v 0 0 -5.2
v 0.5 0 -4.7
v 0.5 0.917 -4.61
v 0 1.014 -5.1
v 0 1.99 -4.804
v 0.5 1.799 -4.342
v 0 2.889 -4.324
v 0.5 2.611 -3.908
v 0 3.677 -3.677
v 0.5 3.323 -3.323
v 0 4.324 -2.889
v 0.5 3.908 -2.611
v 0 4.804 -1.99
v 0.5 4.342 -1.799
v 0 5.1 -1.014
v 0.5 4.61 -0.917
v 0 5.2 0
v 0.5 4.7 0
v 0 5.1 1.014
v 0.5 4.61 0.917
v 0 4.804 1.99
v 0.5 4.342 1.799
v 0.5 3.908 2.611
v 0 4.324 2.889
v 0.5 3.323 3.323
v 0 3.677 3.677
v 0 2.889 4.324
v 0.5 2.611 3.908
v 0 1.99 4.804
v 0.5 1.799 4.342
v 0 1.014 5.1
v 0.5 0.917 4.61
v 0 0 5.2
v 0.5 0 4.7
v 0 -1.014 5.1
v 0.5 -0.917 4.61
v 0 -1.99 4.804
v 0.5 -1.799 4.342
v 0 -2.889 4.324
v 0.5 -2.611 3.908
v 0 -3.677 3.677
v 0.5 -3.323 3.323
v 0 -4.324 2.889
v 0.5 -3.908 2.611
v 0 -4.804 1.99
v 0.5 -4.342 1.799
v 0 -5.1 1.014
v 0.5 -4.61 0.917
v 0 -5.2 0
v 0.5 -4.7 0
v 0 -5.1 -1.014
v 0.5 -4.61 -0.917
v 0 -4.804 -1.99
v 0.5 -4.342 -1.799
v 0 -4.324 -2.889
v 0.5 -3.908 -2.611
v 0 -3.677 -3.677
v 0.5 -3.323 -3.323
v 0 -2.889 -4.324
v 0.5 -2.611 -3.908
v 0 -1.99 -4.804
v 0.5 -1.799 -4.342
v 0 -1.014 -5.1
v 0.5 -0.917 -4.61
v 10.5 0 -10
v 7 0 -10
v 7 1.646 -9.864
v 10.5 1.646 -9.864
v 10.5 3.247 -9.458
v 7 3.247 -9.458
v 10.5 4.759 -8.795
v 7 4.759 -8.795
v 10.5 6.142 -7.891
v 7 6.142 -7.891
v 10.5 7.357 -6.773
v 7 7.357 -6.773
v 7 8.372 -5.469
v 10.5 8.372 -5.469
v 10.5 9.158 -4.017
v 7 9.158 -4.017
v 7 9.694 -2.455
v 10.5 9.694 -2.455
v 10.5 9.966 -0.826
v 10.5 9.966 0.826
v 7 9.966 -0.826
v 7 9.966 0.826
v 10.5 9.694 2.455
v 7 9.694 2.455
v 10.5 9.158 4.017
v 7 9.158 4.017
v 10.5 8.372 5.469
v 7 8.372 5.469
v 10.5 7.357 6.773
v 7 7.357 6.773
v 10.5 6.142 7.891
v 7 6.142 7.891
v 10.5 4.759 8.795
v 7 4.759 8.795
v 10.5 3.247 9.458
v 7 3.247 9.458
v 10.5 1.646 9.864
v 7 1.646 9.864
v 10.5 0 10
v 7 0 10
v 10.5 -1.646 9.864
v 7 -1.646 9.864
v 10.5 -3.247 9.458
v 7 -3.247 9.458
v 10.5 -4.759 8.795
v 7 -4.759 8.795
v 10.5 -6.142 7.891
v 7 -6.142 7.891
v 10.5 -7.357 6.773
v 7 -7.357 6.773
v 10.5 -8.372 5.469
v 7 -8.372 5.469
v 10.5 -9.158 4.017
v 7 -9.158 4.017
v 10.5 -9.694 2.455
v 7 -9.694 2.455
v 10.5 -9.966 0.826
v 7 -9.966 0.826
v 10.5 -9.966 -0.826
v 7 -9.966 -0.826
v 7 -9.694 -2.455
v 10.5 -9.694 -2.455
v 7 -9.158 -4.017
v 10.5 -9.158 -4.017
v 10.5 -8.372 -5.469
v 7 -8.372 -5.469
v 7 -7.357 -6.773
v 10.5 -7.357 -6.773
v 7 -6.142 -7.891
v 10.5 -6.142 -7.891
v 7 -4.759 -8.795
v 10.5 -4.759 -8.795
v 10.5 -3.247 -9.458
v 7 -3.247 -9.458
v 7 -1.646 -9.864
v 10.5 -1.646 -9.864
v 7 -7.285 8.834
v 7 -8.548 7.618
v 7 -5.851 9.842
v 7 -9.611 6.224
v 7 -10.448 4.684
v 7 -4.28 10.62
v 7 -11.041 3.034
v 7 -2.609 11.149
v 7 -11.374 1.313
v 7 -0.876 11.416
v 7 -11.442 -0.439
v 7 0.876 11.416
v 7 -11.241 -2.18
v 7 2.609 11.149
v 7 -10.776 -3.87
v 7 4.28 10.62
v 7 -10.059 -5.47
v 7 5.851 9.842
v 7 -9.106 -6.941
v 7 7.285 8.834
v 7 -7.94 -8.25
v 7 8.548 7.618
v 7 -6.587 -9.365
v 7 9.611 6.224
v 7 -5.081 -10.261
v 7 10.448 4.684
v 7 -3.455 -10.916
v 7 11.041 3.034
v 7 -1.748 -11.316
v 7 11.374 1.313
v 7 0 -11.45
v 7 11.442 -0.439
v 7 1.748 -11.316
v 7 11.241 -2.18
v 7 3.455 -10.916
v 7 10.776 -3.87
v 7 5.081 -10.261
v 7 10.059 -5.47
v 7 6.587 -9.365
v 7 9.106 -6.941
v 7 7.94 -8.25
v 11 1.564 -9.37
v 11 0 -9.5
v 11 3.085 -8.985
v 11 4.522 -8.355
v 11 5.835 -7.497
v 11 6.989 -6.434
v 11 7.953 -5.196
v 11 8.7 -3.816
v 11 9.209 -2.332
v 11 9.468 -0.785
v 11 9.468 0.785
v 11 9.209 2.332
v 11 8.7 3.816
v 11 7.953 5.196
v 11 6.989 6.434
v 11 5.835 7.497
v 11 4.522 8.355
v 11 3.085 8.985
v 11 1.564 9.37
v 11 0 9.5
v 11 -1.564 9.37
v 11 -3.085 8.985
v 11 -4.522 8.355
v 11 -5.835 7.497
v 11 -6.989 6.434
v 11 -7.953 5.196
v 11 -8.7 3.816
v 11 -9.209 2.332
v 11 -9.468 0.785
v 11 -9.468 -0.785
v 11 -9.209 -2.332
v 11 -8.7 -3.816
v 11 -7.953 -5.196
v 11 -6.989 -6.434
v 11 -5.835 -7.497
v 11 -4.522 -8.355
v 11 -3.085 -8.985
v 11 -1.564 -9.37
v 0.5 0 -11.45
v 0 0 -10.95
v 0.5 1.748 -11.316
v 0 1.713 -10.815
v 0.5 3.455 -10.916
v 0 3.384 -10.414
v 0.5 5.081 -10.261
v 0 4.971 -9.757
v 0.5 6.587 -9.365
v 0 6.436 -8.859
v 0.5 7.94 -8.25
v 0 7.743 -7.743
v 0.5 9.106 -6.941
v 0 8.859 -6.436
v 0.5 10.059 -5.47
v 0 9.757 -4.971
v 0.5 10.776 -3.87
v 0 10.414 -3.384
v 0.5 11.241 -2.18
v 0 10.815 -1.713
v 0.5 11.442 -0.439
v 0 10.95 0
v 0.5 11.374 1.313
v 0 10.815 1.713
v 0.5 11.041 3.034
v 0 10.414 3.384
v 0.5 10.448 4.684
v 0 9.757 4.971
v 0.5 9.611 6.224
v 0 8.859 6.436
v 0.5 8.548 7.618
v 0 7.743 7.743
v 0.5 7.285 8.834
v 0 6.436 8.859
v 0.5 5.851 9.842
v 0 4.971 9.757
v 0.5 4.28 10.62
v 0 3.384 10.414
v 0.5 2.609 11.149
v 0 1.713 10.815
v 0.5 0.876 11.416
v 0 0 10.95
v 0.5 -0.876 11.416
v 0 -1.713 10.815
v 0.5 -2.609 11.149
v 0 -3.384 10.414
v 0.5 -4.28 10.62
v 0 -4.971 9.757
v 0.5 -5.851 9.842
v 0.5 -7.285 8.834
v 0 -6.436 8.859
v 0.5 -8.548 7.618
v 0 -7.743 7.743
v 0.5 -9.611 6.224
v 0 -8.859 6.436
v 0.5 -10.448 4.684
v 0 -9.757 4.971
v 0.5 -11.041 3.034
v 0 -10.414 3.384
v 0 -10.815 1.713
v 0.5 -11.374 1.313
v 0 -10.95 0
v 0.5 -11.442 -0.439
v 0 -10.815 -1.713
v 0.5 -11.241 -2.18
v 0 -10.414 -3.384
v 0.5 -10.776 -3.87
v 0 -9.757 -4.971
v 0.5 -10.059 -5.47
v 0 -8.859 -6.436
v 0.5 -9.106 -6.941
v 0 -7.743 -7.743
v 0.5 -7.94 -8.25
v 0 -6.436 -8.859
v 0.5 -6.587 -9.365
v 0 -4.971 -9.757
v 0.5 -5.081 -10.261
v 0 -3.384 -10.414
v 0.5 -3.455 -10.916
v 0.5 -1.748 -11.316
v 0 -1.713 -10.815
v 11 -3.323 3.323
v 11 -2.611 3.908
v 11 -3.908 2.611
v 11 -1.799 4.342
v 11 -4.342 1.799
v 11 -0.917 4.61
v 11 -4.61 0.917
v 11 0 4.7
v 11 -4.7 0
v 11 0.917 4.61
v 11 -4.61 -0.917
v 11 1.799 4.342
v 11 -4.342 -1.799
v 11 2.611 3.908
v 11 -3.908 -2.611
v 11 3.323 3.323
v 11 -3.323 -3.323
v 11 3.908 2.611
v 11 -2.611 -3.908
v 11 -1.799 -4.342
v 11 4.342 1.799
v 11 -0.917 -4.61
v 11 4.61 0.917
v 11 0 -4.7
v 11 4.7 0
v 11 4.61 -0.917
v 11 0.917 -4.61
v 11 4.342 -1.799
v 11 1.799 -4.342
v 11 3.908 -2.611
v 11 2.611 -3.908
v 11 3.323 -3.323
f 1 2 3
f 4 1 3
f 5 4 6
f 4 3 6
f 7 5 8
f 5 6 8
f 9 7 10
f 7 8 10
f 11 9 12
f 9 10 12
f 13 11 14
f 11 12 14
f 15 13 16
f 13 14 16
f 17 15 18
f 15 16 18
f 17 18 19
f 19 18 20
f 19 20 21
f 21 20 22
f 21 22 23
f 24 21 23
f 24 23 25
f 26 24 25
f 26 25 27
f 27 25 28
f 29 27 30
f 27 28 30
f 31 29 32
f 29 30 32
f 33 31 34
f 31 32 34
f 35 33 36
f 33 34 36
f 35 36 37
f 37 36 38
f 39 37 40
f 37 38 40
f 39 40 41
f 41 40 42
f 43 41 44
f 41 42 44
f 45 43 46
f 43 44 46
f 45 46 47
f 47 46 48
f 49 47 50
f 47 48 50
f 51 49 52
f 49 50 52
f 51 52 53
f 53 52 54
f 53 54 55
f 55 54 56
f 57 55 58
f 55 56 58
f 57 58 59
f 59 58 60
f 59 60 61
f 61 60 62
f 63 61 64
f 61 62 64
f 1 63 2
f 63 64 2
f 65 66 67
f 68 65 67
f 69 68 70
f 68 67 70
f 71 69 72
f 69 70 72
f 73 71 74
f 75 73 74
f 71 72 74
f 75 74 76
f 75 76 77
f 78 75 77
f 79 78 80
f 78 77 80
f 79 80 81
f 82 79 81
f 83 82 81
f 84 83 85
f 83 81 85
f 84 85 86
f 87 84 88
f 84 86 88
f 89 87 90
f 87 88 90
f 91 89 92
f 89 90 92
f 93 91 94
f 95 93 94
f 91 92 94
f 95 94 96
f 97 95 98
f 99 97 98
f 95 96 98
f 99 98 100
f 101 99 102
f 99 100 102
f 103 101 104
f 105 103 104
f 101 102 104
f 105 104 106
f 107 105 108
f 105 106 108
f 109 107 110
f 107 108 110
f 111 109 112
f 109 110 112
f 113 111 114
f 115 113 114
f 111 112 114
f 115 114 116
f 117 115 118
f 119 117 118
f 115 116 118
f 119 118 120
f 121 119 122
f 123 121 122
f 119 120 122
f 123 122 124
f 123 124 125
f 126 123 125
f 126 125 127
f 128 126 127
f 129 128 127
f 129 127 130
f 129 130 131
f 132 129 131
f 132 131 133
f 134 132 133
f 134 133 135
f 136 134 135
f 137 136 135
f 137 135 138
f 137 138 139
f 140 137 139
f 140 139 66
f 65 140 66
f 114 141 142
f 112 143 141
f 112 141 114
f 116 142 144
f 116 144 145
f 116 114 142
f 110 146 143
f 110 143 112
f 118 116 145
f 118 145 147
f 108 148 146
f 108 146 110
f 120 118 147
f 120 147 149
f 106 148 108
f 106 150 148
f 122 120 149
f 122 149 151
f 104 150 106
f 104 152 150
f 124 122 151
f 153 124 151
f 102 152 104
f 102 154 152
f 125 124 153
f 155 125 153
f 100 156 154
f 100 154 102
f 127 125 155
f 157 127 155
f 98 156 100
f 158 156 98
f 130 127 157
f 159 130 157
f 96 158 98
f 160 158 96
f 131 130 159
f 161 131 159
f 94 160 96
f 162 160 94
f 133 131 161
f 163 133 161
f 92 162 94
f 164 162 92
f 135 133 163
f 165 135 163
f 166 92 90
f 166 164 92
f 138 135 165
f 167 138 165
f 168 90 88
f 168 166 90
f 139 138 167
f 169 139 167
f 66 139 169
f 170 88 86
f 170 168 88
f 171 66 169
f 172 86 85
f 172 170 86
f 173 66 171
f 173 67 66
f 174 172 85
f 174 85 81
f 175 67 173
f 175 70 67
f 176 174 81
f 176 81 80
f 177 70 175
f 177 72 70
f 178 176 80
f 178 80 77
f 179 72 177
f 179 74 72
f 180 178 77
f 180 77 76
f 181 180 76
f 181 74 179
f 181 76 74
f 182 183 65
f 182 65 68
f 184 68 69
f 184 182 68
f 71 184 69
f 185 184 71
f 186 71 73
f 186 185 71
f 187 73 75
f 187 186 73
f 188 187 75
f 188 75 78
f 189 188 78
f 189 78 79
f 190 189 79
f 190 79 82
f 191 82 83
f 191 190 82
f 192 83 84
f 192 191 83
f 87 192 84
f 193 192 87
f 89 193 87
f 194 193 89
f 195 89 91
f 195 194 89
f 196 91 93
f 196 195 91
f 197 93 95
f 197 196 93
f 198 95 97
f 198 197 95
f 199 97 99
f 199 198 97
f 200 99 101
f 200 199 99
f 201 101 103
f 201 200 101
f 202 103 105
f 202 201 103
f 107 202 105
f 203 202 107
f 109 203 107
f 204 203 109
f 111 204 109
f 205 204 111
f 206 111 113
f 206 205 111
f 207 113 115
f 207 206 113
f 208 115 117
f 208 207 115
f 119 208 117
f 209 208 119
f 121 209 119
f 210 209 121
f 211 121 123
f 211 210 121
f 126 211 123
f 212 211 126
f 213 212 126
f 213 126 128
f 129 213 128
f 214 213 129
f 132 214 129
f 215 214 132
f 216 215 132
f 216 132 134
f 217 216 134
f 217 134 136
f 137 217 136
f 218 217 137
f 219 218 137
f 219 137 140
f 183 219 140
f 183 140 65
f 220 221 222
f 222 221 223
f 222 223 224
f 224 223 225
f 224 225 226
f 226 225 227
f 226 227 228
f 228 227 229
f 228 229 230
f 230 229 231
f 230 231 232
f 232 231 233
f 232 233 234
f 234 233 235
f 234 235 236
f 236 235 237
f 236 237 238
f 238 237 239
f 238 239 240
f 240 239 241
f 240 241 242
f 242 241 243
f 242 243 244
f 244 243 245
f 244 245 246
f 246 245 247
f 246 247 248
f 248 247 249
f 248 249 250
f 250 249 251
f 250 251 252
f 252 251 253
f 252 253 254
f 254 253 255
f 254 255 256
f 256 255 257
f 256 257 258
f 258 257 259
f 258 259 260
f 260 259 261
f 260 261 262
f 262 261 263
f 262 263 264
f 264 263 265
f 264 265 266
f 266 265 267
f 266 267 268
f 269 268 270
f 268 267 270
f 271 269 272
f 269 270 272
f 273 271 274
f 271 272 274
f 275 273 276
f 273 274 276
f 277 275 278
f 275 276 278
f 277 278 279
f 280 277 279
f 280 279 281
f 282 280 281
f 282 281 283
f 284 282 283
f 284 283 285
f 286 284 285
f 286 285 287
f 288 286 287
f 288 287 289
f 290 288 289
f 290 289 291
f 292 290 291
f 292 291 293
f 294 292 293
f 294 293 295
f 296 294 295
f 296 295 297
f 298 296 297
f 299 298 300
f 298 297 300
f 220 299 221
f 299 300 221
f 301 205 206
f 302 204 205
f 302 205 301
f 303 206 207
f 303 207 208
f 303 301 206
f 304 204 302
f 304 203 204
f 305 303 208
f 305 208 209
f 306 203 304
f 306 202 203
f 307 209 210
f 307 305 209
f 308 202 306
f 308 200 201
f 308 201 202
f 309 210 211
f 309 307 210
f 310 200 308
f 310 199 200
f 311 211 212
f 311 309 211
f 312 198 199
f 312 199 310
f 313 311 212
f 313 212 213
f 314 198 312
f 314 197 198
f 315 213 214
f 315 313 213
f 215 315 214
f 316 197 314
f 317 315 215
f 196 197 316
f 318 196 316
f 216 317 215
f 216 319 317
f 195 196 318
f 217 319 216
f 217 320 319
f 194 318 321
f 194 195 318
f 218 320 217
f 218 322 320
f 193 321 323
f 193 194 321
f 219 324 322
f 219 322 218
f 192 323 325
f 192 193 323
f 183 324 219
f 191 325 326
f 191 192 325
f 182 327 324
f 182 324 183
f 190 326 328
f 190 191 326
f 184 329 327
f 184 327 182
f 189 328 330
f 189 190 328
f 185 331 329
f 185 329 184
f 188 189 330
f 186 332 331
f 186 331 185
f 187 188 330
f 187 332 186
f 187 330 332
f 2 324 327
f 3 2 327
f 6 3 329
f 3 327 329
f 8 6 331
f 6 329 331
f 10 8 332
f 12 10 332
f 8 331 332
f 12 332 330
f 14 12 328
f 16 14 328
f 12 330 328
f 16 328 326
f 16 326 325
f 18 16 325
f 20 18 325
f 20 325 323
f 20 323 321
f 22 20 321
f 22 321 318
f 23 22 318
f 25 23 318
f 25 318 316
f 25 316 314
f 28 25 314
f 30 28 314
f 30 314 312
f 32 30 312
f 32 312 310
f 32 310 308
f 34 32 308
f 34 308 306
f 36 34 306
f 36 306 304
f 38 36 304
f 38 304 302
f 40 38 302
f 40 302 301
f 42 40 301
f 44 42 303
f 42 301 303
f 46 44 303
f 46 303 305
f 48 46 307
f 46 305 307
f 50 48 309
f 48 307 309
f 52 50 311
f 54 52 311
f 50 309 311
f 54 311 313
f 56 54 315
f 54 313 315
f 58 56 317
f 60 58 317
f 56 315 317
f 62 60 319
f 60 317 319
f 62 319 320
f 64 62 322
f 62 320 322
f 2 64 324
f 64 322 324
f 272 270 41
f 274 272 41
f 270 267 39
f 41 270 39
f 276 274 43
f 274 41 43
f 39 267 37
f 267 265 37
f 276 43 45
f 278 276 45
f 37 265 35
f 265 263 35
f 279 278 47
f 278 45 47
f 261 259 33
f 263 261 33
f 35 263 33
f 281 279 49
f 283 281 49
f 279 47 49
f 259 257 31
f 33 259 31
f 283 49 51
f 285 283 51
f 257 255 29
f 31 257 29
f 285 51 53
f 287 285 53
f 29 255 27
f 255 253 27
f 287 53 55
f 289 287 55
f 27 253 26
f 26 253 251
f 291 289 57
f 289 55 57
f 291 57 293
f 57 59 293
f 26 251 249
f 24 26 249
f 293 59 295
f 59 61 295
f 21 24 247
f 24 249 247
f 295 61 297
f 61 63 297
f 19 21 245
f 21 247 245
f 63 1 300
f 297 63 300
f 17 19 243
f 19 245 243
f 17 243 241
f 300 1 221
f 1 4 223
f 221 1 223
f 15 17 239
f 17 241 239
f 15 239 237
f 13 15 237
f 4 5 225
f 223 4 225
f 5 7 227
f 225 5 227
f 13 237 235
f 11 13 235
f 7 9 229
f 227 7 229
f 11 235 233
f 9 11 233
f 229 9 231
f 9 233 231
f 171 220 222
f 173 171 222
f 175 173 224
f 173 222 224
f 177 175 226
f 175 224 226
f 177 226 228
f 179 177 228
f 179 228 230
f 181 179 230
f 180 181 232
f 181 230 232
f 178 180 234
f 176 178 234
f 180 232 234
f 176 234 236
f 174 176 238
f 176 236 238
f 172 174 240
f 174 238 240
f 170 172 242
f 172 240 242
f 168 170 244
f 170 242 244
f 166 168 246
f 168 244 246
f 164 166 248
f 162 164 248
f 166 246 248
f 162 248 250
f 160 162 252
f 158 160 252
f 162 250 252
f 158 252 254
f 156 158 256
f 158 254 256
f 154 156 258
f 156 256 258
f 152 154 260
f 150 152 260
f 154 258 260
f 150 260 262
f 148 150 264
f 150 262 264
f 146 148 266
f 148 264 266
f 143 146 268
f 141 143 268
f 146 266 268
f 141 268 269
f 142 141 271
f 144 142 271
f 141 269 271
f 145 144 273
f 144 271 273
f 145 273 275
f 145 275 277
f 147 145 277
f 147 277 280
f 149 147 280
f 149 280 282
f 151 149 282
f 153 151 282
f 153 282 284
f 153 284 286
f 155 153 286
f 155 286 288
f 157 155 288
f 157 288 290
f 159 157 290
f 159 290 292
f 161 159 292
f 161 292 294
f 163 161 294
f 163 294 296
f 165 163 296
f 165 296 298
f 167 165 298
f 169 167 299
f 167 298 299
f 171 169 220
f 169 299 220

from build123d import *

# Parameters (mm, degrees)
SKETCH1_R           = 11.45
BOSS_EXTRUDE1_DEPTH = 7
SKETCH2_R           = 10
BOSS_EXTRUDE2_DEPTH = 4
SKETCH3_R           = 4.7
CUT_EXTRUDE1_DEPTH  = 20.575622595
CHAMFER1_SIZE       = 0.5


with BuildPart() as part:
    # Sketch1 → Boss-Extrude1 (new body)
    with BuildSketch(Plane(origin=(0, 0, 0), x_dir=(0, 0, -1), z_dir=(1, 0, 0))):
        Circle(SKETCH1_R)
    extrude(amount=BOSS_EXTRUDE1_DEPTH)

    # Sketch2 → Boss-Extrude2 (add)
    with BuildSketch(Plane(origin=(7, 0, 0), x_dir=(0, 0, -1), z_dir=(1, 0, 0))):
        Circle(SKETCH2_R)
    extrude(amount=BOSS_EXTRUDE2_DEPTH)

    # Sketch3 → Cut-Extrude1 (cut, through all)
    with BuildSketch(Plane(origin=(11, 0, 0), x_dir=(0, 0, -1), z_dir=(1, 0, 0))):
        Circle(SKETCH3_R)
    extrude(amount=-CUT_EXTRUDE1_DEPTH, mode=Mode.SUBTRACT)

    # Chamfer1
    chamfer1_edges = [part.edges().sort_by_distance(p)[0] for p in [
        (0, 0, 4.7),
        (0, 0, 11.45),
        (11, 0, 10),
    ]]
    chamfer(chamfer1_edges, length=CHAMFER1_SIZE)


solid = part.part
